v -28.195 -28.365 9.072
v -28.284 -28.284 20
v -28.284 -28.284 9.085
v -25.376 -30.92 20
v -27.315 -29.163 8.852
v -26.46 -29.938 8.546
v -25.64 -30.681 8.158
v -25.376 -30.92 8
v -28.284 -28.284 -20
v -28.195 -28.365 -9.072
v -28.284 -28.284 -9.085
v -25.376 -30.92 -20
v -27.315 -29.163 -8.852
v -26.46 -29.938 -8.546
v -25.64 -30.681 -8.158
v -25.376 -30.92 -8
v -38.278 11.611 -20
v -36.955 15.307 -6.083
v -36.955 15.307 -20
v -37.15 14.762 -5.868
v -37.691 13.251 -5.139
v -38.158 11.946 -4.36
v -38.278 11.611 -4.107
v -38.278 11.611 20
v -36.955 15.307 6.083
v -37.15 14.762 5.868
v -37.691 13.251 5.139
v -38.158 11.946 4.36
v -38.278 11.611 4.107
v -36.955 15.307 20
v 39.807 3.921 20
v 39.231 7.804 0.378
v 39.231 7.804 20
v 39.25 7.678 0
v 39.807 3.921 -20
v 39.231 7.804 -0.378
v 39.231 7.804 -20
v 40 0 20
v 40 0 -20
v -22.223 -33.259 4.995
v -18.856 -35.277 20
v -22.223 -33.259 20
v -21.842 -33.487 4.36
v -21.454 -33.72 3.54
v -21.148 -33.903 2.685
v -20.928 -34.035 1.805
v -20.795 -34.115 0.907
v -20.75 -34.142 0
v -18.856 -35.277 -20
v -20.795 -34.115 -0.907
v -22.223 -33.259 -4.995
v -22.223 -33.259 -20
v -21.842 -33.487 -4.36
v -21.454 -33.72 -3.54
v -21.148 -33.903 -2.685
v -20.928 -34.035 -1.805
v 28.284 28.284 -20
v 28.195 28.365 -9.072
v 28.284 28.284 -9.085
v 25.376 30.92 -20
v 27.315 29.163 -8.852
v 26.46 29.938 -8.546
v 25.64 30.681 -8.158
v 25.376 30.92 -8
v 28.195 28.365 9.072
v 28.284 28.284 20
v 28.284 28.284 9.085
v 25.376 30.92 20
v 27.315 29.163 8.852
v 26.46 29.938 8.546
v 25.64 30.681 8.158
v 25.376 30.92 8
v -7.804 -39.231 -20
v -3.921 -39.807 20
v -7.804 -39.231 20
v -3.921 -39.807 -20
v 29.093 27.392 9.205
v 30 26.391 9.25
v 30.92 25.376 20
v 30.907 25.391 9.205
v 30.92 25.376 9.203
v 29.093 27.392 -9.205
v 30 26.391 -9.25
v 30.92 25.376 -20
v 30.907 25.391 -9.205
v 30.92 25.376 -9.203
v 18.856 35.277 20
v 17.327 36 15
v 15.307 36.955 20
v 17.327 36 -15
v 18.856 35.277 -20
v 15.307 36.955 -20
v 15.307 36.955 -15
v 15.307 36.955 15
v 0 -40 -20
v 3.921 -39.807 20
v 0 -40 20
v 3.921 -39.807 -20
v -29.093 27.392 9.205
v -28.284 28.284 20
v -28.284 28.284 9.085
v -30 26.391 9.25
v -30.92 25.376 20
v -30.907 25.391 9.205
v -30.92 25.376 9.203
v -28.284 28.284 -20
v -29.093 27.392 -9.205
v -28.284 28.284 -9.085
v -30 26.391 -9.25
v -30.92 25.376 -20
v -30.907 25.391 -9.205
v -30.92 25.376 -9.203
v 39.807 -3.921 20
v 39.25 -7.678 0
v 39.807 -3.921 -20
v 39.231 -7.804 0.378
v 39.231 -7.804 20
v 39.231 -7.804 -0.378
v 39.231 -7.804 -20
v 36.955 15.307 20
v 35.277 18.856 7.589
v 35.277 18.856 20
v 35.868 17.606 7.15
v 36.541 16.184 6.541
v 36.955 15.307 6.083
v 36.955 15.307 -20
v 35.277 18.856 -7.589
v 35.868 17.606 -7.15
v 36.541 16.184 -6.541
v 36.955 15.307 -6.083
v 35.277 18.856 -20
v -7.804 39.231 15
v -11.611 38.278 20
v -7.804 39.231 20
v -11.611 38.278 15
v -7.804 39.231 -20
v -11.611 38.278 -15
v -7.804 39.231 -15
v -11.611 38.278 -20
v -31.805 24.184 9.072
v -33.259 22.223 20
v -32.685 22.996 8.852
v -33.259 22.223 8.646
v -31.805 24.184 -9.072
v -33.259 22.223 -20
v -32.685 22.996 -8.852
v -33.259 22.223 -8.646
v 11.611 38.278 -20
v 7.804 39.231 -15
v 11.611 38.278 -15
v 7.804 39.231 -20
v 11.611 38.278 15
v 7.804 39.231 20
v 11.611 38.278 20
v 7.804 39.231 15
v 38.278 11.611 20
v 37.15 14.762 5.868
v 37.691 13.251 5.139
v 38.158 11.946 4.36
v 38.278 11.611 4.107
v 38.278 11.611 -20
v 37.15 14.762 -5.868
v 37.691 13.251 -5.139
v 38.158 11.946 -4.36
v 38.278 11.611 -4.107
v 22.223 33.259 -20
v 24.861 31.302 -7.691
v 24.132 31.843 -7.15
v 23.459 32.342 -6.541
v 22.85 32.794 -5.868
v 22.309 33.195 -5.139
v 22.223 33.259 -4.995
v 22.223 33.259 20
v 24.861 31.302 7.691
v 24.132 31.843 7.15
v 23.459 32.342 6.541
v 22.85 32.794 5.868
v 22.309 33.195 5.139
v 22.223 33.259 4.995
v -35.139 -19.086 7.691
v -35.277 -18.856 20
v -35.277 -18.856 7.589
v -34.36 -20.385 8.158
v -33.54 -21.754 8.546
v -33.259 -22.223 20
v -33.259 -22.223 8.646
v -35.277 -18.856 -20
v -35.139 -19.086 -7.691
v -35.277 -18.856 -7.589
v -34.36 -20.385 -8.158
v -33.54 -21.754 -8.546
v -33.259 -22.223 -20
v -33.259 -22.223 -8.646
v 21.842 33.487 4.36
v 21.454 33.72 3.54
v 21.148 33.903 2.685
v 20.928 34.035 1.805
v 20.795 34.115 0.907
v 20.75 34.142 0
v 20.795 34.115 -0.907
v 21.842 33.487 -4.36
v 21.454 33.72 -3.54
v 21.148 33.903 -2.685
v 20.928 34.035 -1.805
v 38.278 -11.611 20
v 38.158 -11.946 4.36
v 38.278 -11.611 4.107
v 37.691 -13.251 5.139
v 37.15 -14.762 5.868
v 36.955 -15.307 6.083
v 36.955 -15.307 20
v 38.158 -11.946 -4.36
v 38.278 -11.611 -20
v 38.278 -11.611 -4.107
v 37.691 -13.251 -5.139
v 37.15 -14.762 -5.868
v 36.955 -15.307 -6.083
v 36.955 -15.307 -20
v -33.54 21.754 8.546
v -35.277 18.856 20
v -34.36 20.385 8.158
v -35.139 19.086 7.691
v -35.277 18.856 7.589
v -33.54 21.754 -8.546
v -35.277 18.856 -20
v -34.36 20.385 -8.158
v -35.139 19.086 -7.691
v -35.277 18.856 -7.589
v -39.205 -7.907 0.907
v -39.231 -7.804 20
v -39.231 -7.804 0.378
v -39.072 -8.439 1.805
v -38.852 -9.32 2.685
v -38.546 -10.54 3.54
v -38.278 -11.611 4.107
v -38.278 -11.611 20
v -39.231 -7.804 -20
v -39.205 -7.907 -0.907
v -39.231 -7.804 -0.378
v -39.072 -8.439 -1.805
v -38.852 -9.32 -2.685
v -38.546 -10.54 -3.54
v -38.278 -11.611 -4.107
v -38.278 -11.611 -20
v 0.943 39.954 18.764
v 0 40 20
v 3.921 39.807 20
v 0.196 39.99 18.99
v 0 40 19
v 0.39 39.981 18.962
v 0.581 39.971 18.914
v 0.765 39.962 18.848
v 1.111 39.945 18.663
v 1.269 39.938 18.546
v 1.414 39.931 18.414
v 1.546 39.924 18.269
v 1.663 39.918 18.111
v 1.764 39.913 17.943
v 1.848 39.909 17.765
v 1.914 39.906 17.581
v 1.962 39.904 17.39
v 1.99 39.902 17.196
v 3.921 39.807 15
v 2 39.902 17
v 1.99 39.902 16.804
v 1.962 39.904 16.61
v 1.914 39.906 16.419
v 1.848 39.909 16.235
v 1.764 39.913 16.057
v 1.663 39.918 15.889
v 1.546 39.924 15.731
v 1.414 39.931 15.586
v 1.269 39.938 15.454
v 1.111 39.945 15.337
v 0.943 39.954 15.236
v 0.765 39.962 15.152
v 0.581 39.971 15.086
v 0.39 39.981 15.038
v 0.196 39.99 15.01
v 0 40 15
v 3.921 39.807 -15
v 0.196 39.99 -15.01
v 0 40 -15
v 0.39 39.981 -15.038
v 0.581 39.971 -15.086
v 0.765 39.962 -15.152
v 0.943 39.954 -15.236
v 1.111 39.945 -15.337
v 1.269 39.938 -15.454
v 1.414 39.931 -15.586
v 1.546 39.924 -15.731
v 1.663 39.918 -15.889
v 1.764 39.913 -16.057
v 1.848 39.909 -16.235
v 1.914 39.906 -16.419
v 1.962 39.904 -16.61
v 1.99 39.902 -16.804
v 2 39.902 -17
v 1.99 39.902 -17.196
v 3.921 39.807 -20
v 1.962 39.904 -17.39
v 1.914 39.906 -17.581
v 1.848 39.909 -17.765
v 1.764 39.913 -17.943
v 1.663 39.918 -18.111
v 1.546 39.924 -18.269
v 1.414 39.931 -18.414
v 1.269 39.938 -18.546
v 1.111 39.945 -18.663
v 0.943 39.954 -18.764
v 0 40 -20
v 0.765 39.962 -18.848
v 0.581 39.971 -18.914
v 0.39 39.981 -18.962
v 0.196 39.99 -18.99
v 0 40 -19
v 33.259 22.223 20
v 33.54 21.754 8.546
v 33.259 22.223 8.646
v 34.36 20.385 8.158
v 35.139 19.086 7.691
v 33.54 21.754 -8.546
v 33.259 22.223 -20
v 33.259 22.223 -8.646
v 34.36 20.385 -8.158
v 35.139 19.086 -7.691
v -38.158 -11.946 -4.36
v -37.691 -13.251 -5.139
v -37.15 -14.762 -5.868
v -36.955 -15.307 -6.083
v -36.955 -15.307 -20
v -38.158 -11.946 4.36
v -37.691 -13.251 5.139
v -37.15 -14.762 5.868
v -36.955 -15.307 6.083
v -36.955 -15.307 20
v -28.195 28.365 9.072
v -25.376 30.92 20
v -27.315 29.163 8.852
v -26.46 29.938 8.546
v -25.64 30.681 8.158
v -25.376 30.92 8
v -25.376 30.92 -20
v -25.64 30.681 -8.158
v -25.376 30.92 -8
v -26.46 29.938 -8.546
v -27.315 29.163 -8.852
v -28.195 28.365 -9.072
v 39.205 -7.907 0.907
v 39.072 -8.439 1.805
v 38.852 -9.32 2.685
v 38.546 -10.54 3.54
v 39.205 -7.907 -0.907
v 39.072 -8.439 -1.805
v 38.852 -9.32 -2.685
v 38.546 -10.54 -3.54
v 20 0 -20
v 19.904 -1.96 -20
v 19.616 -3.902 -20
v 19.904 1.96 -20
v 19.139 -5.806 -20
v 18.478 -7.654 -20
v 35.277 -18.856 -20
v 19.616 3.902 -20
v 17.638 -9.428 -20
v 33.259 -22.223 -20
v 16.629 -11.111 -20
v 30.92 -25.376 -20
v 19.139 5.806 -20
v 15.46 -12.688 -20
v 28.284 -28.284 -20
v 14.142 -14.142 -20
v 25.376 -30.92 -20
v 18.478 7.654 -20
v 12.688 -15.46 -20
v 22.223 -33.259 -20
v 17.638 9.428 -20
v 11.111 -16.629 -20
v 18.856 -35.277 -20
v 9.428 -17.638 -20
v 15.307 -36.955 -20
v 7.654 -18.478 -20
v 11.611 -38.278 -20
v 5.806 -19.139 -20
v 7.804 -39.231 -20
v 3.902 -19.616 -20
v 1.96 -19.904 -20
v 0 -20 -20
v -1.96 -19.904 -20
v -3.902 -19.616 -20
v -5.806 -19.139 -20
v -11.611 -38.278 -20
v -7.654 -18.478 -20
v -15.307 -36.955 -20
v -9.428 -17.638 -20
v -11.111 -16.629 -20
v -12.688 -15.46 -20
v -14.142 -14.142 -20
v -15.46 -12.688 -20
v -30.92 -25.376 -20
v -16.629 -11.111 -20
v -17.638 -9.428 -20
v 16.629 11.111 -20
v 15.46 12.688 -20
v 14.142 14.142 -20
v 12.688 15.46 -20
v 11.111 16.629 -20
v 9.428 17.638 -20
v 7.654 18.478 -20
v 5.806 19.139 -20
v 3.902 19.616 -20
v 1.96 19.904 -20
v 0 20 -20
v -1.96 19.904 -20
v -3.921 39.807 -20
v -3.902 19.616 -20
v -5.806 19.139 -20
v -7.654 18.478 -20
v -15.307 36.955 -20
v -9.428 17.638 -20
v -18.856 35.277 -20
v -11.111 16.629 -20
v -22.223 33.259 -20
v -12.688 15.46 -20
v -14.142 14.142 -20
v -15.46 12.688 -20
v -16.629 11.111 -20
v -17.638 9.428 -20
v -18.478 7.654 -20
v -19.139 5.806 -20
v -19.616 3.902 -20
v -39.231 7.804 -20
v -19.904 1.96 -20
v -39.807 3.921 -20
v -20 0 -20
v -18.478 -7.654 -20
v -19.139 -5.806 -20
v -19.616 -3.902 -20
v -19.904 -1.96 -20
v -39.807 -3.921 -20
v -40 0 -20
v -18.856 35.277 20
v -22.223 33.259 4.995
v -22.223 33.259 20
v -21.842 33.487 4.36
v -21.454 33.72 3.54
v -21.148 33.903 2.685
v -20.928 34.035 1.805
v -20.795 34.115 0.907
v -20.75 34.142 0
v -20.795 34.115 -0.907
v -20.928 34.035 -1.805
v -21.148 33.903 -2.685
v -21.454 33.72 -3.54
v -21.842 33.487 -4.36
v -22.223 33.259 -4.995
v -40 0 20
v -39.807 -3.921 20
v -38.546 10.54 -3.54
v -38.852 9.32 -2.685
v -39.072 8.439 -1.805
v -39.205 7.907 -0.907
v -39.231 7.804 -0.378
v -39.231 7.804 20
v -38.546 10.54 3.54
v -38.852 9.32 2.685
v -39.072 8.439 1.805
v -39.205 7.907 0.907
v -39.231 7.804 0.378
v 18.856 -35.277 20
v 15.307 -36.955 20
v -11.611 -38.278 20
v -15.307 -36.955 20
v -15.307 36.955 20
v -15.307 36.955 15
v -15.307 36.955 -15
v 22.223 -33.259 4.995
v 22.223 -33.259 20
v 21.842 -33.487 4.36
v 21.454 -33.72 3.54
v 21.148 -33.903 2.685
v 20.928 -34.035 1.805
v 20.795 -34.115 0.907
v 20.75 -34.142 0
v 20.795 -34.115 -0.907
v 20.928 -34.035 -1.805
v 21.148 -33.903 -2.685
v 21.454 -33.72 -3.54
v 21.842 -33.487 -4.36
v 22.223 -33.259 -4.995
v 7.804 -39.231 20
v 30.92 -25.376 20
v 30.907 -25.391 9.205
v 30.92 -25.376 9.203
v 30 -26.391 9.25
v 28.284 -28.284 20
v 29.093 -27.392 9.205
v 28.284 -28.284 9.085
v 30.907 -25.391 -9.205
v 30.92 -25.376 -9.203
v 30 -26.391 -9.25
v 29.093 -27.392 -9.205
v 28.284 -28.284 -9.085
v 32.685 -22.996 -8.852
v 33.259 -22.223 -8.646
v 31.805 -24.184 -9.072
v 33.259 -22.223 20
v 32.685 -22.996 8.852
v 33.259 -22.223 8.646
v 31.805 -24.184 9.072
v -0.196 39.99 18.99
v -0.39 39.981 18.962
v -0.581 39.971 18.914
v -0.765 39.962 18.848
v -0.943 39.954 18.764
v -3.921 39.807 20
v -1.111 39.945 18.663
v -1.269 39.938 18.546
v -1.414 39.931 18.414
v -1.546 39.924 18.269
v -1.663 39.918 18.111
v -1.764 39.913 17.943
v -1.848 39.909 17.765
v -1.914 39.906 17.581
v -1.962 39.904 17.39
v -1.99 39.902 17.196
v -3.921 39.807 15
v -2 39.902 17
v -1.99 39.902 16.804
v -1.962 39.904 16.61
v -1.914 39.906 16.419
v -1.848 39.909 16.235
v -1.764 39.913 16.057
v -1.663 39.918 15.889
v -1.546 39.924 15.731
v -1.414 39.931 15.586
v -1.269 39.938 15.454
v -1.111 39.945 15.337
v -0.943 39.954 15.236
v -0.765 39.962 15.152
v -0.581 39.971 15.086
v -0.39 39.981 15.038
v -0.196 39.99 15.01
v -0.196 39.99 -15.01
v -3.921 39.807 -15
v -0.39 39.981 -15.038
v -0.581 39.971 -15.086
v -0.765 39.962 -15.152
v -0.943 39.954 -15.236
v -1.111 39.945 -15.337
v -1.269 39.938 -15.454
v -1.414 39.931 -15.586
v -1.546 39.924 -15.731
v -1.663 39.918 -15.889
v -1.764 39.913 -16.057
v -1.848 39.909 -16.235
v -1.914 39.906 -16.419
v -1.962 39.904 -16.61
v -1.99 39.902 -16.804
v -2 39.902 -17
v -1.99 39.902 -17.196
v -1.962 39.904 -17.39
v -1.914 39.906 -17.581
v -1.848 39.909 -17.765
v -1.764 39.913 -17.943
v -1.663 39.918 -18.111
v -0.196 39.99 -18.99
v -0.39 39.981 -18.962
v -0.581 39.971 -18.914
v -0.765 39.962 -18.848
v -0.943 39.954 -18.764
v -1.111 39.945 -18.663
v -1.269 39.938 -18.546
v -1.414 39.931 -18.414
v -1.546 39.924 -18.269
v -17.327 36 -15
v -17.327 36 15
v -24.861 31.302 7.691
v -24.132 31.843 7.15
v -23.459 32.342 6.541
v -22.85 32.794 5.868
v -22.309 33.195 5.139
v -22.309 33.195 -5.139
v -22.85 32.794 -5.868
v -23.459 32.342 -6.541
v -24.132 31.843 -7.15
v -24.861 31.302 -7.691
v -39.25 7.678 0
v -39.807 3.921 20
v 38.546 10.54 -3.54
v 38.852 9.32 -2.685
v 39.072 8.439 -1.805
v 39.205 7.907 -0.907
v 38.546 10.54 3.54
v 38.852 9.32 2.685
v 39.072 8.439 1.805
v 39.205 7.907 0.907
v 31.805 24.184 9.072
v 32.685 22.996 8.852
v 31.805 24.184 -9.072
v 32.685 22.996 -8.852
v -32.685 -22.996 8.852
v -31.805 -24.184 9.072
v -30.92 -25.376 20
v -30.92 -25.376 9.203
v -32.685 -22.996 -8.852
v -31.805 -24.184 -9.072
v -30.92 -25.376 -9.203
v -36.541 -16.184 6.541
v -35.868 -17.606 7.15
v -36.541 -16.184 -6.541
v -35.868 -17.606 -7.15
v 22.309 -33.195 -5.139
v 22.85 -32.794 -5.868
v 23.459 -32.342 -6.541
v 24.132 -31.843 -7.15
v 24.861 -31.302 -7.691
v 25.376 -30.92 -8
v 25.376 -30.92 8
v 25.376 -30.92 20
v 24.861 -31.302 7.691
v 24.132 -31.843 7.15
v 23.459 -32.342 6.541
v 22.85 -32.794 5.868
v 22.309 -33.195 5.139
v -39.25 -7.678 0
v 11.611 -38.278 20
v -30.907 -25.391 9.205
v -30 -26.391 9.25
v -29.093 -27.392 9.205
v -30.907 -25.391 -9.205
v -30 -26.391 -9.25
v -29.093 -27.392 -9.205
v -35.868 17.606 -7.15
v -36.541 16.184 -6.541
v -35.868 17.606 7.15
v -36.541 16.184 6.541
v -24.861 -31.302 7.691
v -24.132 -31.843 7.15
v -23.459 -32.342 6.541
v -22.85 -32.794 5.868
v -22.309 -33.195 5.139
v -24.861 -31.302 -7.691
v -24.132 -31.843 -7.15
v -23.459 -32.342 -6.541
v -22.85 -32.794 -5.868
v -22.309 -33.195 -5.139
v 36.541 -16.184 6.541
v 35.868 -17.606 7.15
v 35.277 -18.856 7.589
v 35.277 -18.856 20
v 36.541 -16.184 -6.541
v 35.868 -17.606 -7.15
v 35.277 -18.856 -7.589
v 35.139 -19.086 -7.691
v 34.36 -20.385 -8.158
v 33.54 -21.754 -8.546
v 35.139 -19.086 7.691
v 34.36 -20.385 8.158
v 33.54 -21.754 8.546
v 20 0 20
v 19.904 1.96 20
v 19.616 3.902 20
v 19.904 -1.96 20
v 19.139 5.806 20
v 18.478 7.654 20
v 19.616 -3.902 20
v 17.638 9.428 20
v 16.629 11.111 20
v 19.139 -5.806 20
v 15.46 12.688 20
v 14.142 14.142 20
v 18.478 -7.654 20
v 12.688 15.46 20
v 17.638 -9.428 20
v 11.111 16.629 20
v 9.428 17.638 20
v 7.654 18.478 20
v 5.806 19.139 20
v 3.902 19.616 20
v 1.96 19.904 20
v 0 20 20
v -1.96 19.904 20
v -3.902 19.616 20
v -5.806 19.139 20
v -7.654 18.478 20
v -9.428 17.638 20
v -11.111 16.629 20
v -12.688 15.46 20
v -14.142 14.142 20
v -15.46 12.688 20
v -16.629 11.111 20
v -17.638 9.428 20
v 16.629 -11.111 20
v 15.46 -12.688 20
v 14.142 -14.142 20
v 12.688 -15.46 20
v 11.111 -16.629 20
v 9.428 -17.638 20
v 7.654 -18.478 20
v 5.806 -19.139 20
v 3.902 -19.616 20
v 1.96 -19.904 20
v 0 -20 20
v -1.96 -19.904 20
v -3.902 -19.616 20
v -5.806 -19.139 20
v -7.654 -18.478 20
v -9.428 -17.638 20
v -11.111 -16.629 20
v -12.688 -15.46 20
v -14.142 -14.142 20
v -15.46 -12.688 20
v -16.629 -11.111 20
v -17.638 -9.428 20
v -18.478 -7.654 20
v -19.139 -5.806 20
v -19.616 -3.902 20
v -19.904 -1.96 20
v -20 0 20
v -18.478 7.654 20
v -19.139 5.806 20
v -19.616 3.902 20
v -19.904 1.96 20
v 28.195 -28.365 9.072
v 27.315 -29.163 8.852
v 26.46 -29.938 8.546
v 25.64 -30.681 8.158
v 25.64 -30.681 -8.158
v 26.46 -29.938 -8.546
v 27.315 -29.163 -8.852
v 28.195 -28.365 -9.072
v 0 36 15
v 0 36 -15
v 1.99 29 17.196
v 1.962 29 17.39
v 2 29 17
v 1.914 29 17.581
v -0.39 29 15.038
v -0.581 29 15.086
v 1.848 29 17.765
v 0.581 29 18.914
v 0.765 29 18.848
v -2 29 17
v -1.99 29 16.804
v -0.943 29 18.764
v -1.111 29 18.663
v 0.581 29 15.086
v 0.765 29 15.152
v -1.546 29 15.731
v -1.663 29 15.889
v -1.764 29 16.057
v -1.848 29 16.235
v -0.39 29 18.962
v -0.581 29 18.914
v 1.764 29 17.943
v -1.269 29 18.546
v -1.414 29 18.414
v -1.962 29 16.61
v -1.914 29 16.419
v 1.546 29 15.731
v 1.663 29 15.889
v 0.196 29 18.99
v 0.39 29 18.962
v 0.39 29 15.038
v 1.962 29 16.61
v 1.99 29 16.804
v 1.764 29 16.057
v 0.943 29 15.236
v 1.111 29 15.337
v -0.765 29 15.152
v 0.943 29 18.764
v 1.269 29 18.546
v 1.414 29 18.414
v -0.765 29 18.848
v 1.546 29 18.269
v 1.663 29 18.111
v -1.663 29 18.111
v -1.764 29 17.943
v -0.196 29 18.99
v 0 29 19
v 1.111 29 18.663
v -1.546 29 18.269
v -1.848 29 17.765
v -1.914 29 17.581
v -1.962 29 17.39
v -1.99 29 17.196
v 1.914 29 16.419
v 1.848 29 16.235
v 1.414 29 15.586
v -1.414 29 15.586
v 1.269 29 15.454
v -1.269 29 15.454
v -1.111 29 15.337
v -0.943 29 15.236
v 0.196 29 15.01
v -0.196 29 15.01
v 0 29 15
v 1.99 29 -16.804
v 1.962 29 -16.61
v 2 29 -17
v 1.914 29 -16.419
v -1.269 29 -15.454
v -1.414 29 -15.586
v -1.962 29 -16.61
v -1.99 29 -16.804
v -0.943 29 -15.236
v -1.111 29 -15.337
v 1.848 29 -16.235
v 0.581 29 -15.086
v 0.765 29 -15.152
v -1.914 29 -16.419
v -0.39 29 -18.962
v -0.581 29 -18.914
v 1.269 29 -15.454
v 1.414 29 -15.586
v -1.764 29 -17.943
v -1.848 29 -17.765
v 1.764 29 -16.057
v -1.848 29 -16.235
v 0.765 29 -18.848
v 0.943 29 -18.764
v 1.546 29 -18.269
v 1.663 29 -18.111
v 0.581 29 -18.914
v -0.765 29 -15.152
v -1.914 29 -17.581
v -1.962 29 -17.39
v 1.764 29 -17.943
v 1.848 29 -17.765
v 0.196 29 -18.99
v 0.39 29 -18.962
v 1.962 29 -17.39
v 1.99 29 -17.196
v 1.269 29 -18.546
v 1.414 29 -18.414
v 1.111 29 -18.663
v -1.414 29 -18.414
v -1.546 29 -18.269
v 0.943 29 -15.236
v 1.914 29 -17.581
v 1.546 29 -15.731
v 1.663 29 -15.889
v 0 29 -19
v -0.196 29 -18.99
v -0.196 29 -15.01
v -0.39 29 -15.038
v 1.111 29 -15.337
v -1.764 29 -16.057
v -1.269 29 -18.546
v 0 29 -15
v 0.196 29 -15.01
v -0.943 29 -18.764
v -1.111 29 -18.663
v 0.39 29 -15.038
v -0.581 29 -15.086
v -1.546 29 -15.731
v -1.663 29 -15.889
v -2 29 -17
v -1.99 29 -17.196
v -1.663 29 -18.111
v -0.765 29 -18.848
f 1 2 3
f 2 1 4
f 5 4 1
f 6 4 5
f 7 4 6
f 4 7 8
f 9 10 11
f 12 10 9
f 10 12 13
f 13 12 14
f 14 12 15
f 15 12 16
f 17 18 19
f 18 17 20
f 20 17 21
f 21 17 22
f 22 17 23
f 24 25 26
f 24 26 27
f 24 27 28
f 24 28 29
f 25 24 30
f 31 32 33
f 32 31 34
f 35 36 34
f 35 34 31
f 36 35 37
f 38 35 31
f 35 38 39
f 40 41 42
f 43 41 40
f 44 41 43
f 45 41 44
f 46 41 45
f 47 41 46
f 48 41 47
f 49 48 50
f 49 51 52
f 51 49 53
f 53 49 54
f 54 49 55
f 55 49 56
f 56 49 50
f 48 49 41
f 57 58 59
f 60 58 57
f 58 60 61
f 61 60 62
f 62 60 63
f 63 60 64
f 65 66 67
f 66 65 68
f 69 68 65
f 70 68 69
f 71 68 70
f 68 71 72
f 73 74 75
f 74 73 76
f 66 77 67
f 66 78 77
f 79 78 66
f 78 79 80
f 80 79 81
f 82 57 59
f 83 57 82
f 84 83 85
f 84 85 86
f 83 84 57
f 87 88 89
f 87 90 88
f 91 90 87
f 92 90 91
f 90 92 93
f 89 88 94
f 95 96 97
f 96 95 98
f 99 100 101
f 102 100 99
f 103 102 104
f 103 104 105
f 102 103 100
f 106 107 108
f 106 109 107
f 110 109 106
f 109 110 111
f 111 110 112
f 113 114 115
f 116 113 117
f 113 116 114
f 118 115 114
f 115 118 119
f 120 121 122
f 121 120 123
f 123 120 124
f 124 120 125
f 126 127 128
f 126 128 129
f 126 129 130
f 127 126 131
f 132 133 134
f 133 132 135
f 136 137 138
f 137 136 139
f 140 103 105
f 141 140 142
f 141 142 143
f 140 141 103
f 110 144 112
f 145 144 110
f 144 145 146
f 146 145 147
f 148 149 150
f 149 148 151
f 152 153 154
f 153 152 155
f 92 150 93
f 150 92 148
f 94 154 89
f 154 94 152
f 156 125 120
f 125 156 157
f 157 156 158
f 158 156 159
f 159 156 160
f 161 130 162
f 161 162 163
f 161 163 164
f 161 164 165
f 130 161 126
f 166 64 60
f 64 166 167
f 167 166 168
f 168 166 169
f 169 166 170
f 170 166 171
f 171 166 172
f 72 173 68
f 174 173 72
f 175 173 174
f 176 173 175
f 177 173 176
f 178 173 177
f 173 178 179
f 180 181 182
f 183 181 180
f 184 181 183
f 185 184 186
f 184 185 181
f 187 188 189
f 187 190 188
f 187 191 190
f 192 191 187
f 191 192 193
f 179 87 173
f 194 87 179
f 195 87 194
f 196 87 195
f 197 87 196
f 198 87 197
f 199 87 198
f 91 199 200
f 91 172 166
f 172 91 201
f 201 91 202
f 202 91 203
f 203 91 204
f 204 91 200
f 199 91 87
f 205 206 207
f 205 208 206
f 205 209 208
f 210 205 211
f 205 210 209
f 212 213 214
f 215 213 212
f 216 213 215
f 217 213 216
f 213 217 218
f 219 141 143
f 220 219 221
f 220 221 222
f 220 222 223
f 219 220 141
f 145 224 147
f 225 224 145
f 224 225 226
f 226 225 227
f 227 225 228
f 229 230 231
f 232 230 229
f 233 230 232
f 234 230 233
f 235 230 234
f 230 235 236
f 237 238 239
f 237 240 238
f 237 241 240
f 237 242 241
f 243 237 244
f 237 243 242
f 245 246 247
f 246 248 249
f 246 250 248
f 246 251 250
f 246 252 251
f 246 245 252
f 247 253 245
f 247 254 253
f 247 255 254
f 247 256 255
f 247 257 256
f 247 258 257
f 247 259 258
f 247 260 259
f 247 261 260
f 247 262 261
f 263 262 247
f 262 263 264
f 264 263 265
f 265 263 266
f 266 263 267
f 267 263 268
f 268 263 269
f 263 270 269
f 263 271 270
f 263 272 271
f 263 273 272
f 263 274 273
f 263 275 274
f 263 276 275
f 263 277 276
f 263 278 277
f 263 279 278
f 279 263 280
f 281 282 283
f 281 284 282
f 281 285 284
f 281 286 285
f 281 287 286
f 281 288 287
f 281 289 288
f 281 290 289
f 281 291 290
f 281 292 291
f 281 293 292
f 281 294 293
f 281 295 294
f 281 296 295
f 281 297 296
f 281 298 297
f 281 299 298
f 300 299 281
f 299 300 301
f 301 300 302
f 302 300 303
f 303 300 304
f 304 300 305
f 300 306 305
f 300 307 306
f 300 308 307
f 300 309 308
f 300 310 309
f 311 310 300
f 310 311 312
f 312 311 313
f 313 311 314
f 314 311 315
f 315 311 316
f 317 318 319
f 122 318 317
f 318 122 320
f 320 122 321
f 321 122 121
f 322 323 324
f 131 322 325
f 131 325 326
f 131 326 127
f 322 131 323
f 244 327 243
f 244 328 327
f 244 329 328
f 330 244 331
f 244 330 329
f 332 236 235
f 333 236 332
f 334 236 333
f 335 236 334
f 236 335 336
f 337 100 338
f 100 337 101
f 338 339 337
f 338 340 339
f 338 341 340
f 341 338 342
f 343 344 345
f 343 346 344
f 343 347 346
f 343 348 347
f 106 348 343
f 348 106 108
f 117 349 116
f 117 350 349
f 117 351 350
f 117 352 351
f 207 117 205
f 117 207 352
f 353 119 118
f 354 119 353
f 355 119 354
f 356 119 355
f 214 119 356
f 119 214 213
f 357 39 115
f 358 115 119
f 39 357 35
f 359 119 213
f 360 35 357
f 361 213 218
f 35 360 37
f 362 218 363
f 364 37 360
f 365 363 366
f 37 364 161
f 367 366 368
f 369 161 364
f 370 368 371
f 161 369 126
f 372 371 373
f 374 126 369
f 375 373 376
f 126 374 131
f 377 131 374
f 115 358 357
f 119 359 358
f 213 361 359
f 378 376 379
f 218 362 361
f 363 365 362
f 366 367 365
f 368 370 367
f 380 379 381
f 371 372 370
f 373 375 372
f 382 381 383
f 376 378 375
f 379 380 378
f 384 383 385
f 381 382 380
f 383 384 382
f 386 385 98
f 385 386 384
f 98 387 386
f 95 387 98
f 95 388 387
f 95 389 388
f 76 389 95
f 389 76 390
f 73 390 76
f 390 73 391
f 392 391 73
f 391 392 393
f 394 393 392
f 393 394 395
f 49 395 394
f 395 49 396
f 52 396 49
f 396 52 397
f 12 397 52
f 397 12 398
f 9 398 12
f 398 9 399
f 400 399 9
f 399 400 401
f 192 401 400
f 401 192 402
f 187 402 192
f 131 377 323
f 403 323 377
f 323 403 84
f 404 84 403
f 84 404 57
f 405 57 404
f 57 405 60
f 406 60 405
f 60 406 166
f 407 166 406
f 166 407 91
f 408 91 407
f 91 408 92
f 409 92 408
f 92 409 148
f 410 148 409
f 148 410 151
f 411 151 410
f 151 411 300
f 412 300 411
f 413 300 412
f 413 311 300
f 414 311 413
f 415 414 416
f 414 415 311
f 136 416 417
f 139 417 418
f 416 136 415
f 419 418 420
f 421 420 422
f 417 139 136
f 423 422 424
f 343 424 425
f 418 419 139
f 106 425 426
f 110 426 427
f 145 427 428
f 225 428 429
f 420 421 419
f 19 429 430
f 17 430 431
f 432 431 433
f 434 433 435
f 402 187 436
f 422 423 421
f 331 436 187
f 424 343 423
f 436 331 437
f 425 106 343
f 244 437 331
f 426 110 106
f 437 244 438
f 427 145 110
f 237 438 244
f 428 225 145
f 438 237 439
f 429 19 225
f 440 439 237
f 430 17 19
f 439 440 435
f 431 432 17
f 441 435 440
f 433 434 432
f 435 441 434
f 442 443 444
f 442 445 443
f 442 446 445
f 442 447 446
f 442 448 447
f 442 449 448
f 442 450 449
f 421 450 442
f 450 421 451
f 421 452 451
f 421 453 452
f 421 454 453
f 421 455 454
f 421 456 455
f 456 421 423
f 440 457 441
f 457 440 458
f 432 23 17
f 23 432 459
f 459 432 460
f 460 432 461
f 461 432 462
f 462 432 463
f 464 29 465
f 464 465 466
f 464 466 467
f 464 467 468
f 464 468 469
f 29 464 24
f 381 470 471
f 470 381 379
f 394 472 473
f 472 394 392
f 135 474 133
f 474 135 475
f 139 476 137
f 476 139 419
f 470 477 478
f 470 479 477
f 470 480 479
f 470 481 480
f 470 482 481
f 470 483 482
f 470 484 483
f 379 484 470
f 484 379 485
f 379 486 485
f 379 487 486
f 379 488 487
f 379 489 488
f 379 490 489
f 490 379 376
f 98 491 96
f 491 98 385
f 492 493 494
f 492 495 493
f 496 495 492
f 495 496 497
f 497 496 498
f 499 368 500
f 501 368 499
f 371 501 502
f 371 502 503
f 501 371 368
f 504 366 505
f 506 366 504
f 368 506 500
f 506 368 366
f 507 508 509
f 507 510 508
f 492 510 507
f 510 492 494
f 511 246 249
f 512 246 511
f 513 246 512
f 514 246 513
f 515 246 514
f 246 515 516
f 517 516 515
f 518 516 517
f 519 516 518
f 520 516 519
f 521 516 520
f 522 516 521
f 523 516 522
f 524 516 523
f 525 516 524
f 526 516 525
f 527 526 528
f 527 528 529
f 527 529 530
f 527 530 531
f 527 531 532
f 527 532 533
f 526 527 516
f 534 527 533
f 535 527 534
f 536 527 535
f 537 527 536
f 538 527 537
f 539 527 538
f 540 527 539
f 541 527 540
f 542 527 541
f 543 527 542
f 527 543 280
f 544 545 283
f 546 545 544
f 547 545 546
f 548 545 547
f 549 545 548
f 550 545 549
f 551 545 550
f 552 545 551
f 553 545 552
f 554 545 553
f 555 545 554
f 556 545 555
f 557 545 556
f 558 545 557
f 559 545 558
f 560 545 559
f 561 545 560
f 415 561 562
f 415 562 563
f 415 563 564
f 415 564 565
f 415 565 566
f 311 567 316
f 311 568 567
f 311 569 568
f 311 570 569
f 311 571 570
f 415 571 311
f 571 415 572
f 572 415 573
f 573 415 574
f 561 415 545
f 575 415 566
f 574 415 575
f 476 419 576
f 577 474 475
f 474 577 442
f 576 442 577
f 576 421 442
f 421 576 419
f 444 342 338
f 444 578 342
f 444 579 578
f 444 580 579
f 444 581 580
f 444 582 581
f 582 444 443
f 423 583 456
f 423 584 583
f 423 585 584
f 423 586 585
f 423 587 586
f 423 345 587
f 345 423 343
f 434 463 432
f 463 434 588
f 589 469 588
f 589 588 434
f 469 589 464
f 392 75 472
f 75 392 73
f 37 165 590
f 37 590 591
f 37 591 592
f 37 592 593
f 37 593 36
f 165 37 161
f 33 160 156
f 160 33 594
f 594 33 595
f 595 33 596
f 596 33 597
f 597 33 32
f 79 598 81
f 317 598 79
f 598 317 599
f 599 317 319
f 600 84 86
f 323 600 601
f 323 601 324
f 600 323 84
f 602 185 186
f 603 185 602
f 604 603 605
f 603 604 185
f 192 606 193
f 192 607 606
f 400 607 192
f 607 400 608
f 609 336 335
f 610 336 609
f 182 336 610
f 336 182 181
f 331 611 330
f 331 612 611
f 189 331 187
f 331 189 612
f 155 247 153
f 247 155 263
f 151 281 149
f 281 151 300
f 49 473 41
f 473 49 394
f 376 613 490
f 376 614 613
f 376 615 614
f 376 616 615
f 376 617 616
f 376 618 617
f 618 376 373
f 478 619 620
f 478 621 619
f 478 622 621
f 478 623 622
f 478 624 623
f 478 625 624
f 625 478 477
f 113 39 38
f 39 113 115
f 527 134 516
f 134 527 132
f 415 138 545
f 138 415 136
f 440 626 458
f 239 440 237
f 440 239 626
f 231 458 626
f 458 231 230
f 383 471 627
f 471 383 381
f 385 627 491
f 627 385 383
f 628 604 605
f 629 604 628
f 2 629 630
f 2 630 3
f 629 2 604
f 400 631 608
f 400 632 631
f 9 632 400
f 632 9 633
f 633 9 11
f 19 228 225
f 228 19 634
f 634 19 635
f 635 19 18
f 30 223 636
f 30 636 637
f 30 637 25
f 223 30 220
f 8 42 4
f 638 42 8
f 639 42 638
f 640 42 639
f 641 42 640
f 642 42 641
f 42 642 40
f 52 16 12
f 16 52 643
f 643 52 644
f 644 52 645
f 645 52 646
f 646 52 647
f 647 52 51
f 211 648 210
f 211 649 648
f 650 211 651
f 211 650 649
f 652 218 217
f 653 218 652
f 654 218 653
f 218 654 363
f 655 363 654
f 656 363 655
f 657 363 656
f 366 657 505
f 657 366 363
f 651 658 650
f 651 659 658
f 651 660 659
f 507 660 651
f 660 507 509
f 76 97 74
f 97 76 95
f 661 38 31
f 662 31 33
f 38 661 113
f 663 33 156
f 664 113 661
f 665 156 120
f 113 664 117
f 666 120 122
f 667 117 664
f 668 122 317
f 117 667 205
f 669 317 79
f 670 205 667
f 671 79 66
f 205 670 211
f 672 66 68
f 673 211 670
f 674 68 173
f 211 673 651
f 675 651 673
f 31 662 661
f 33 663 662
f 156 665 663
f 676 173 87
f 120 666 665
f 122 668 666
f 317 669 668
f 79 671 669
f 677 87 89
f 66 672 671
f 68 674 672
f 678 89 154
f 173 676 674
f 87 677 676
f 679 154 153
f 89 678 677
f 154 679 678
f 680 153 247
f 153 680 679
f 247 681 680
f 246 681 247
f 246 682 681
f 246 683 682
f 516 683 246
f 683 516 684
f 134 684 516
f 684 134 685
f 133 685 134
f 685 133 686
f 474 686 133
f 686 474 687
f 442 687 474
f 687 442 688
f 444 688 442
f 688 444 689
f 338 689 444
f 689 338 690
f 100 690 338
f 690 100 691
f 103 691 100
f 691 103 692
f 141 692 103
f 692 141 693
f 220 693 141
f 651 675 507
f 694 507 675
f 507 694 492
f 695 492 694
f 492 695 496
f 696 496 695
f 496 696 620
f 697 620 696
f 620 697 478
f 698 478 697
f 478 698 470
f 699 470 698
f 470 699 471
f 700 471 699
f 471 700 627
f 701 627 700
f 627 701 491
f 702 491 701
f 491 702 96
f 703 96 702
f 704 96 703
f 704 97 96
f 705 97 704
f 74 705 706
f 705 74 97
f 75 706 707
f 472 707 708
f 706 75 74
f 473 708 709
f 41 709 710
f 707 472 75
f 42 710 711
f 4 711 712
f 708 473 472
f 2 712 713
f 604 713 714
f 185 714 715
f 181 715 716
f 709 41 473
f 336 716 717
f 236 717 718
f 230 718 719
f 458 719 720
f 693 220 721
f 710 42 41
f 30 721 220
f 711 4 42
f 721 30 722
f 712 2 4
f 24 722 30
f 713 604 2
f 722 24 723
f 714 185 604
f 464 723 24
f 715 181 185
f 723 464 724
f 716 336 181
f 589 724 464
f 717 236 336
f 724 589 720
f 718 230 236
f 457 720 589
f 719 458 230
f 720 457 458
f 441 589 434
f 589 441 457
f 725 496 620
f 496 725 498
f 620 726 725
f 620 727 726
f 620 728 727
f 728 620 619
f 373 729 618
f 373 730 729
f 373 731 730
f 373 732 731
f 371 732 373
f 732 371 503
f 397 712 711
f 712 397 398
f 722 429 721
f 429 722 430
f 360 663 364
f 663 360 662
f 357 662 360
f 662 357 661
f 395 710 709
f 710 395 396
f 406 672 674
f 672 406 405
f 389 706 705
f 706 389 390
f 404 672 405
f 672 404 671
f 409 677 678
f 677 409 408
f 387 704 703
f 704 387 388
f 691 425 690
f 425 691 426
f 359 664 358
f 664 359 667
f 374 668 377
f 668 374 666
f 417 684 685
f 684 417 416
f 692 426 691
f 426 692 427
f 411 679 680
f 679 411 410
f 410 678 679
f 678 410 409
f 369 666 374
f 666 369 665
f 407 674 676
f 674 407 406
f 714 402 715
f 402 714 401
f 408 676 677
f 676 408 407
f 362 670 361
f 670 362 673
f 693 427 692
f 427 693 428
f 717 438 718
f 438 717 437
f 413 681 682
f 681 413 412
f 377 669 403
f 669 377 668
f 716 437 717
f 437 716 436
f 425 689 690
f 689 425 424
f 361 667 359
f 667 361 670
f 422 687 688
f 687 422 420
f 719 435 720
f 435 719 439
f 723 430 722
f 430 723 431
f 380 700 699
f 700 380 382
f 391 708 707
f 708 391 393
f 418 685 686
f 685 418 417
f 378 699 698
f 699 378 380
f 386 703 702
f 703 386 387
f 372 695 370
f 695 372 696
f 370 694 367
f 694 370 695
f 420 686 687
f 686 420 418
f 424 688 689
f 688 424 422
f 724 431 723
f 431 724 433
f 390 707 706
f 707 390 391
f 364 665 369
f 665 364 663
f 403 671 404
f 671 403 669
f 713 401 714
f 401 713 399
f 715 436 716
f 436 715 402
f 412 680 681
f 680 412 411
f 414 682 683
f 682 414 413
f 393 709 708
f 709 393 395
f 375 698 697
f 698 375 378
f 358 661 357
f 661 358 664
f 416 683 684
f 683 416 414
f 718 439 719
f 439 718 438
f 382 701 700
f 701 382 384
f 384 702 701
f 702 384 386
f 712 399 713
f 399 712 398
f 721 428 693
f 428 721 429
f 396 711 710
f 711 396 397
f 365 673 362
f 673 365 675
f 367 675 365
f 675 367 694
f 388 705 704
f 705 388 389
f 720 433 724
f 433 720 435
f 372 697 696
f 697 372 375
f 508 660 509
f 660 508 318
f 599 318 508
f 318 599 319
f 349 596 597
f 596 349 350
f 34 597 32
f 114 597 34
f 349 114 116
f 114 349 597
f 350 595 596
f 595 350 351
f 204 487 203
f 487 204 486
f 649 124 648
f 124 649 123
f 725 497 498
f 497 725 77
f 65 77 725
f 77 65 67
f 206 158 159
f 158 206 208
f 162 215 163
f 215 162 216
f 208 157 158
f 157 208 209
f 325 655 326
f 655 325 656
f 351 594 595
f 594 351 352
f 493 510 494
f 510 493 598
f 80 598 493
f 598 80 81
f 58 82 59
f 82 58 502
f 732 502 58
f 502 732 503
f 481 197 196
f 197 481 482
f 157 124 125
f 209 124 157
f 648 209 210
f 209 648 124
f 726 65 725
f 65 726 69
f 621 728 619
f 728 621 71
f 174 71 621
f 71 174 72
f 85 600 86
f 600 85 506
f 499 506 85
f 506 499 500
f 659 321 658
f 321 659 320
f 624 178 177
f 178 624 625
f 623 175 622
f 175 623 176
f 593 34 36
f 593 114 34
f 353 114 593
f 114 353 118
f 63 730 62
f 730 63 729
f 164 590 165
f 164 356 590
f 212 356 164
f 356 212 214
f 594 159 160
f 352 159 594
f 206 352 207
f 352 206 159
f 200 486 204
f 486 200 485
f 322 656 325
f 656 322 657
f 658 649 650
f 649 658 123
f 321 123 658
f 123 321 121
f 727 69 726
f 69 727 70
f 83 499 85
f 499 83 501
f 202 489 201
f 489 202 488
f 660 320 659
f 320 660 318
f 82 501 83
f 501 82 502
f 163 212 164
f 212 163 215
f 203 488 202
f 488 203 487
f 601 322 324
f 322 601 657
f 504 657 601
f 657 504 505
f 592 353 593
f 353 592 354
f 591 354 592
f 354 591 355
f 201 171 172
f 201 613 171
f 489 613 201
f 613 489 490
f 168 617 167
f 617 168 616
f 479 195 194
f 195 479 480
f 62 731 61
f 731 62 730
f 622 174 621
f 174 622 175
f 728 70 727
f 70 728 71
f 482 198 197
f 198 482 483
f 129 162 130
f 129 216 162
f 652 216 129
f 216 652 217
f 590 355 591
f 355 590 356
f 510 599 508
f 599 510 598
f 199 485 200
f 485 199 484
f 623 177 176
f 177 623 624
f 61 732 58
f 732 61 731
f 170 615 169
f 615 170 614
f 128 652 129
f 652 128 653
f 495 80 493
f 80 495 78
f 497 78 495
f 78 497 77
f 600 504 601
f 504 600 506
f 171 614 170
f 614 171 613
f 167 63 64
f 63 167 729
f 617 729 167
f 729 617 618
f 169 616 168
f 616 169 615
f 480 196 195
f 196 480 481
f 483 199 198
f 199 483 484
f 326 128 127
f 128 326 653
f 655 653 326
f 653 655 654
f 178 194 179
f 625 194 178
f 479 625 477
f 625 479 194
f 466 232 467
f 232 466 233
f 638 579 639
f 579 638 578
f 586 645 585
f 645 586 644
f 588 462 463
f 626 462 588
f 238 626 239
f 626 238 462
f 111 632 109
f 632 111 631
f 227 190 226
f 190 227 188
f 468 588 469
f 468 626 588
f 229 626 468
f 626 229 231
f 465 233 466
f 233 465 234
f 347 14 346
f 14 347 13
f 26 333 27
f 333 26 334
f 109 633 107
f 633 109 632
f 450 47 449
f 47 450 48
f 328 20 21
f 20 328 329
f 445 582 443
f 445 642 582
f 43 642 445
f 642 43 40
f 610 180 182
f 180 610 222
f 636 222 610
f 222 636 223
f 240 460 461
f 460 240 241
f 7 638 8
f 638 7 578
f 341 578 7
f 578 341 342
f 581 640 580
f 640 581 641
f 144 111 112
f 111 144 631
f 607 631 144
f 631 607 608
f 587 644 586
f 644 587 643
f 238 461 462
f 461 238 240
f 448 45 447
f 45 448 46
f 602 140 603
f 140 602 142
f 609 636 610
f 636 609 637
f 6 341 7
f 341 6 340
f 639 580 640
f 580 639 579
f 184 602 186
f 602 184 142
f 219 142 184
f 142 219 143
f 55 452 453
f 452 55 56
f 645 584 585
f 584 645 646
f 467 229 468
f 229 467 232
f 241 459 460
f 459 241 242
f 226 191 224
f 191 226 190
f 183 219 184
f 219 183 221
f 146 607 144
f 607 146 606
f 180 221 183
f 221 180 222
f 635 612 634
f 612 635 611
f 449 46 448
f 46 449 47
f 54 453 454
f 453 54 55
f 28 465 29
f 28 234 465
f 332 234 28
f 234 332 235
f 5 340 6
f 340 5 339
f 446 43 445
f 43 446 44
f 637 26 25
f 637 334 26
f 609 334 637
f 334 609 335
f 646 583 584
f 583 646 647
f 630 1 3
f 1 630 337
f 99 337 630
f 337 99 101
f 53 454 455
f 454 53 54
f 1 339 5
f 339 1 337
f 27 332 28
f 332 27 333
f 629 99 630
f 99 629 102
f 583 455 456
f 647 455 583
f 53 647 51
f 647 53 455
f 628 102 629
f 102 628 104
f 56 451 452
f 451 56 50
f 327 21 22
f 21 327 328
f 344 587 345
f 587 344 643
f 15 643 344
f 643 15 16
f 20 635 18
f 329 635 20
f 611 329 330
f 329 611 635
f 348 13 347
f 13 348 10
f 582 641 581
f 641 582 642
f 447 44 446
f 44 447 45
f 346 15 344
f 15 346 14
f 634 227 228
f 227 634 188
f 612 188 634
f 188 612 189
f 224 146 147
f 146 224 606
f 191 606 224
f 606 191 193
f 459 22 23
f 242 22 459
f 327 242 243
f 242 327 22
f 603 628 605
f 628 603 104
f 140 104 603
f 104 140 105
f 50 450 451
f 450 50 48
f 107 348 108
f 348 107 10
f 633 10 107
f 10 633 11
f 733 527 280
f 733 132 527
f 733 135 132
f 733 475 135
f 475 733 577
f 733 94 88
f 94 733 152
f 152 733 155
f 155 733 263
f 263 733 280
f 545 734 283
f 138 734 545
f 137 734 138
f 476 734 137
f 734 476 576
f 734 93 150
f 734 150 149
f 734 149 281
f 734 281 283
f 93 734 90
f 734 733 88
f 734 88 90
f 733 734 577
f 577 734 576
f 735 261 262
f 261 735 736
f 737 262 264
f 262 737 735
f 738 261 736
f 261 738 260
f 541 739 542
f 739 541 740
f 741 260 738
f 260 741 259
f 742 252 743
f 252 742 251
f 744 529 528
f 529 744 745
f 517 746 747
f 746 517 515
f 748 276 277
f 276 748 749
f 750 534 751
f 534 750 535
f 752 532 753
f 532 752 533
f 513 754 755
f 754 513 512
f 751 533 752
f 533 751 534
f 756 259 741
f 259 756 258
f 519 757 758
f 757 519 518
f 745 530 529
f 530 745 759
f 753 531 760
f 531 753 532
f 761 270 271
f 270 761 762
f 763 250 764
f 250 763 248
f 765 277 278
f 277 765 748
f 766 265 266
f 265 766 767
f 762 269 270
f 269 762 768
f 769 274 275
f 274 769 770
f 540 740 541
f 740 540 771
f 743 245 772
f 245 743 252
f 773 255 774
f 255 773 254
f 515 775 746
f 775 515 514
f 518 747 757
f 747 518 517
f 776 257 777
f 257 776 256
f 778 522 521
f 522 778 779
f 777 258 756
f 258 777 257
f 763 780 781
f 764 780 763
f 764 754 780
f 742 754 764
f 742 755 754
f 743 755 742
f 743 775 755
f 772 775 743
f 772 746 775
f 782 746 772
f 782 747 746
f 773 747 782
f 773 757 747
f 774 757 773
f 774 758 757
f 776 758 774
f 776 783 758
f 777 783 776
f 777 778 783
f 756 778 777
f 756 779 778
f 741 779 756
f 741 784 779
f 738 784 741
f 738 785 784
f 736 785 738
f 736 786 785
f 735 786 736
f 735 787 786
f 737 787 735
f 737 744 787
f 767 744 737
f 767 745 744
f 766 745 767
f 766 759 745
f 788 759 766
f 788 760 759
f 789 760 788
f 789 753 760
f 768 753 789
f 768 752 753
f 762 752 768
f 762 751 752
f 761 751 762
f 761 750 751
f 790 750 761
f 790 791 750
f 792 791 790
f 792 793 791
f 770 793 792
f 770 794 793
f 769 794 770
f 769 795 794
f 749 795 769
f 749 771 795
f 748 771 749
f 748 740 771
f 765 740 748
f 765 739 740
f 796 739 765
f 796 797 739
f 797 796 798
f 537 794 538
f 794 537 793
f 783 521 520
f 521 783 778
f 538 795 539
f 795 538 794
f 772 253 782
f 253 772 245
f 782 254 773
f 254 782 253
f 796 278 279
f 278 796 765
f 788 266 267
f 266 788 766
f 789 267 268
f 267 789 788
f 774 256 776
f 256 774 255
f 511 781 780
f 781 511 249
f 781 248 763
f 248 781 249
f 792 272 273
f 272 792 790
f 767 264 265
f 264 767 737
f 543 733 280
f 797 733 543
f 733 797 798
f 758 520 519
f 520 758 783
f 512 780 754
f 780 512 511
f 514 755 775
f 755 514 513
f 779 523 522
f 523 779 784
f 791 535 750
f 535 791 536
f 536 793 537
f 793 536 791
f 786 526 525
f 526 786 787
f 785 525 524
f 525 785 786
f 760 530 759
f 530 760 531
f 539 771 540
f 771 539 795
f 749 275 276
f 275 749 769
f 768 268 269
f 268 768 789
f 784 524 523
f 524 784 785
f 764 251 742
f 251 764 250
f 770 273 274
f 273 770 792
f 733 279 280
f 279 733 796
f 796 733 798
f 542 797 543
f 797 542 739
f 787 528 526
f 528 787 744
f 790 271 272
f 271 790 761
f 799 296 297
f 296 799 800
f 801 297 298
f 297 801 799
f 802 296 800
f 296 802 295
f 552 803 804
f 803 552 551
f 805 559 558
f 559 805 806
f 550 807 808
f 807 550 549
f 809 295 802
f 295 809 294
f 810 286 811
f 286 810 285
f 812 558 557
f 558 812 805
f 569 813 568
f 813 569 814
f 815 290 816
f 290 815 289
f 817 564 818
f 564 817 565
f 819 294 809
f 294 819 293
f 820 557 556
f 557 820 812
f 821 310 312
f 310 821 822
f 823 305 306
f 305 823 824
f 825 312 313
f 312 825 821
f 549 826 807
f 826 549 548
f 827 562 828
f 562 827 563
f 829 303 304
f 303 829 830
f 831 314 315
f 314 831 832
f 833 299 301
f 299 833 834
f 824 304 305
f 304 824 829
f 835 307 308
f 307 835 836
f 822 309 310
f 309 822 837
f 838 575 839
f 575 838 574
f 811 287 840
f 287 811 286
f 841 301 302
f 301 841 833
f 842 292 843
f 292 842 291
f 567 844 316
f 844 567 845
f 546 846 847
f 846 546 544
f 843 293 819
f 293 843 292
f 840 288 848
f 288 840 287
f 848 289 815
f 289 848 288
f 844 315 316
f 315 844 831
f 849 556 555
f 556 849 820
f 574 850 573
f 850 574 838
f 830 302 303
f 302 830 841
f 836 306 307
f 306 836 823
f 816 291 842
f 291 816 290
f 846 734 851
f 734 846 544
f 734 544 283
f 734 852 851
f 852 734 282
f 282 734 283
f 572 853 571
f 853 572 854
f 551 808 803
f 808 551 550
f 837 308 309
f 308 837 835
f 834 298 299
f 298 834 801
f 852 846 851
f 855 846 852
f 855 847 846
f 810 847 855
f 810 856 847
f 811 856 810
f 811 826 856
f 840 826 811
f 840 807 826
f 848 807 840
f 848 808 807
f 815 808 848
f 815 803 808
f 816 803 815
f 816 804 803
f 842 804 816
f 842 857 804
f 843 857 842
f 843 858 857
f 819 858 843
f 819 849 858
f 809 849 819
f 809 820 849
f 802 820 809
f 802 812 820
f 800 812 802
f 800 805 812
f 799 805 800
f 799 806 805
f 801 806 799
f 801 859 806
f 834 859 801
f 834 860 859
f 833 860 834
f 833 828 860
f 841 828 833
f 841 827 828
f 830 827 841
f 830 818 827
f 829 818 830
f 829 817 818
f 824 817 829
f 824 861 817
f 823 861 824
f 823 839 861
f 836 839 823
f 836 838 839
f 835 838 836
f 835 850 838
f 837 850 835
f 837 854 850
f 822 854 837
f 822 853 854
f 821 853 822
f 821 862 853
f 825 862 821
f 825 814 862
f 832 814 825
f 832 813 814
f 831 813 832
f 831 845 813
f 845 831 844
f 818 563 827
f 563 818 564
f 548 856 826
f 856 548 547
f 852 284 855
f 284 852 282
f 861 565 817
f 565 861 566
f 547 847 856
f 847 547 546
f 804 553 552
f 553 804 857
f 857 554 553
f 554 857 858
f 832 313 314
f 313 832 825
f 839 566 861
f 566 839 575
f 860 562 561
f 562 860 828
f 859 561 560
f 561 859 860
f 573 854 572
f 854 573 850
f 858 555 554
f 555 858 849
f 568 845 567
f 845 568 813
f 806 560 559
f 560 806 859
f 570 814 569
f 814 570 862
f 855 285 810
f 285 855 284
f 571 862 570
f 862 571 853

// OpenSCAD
// COBRA Vertebra - T3 V9
// Height: 40.0mm, OD: 80.0mm

$fn = 64;

difference() {
    // Outer cylinder
    cylinder(h=40.0, d=80.0, center=true);
    
    // Inner channel
    cylinder(h=42.0, d=40.0, center=true);

    // Battery cavity 1
    rotate([0, 0, 0])
    translate([30.0, 0, 0])
    rotate([90, 0, 0])
    cylinder(h=74.0, d=18.5, center=true);

    // Battery cavity 2
    rotate([0, 0, 180])
    translate([30.0, 0, 0])
    rotate([90, 0, 0])
    cylinder(h=74.0, d=18.5, center=true);

    // Solar panel cavity
    translate([0, 38.0, 0])
    cube([50, 4, 30], center=true);

    // Pivot holes
    translate([0, 40.0, 17.0])
    rotate([90, 0, 0])
    cylinder(h=22.0, d=4, center=true);
    
    translate([0, 40.0, -17.0])
    rotate([90, 0, 0])
    cylinder(h=22.0, d=4, center=true);
}
